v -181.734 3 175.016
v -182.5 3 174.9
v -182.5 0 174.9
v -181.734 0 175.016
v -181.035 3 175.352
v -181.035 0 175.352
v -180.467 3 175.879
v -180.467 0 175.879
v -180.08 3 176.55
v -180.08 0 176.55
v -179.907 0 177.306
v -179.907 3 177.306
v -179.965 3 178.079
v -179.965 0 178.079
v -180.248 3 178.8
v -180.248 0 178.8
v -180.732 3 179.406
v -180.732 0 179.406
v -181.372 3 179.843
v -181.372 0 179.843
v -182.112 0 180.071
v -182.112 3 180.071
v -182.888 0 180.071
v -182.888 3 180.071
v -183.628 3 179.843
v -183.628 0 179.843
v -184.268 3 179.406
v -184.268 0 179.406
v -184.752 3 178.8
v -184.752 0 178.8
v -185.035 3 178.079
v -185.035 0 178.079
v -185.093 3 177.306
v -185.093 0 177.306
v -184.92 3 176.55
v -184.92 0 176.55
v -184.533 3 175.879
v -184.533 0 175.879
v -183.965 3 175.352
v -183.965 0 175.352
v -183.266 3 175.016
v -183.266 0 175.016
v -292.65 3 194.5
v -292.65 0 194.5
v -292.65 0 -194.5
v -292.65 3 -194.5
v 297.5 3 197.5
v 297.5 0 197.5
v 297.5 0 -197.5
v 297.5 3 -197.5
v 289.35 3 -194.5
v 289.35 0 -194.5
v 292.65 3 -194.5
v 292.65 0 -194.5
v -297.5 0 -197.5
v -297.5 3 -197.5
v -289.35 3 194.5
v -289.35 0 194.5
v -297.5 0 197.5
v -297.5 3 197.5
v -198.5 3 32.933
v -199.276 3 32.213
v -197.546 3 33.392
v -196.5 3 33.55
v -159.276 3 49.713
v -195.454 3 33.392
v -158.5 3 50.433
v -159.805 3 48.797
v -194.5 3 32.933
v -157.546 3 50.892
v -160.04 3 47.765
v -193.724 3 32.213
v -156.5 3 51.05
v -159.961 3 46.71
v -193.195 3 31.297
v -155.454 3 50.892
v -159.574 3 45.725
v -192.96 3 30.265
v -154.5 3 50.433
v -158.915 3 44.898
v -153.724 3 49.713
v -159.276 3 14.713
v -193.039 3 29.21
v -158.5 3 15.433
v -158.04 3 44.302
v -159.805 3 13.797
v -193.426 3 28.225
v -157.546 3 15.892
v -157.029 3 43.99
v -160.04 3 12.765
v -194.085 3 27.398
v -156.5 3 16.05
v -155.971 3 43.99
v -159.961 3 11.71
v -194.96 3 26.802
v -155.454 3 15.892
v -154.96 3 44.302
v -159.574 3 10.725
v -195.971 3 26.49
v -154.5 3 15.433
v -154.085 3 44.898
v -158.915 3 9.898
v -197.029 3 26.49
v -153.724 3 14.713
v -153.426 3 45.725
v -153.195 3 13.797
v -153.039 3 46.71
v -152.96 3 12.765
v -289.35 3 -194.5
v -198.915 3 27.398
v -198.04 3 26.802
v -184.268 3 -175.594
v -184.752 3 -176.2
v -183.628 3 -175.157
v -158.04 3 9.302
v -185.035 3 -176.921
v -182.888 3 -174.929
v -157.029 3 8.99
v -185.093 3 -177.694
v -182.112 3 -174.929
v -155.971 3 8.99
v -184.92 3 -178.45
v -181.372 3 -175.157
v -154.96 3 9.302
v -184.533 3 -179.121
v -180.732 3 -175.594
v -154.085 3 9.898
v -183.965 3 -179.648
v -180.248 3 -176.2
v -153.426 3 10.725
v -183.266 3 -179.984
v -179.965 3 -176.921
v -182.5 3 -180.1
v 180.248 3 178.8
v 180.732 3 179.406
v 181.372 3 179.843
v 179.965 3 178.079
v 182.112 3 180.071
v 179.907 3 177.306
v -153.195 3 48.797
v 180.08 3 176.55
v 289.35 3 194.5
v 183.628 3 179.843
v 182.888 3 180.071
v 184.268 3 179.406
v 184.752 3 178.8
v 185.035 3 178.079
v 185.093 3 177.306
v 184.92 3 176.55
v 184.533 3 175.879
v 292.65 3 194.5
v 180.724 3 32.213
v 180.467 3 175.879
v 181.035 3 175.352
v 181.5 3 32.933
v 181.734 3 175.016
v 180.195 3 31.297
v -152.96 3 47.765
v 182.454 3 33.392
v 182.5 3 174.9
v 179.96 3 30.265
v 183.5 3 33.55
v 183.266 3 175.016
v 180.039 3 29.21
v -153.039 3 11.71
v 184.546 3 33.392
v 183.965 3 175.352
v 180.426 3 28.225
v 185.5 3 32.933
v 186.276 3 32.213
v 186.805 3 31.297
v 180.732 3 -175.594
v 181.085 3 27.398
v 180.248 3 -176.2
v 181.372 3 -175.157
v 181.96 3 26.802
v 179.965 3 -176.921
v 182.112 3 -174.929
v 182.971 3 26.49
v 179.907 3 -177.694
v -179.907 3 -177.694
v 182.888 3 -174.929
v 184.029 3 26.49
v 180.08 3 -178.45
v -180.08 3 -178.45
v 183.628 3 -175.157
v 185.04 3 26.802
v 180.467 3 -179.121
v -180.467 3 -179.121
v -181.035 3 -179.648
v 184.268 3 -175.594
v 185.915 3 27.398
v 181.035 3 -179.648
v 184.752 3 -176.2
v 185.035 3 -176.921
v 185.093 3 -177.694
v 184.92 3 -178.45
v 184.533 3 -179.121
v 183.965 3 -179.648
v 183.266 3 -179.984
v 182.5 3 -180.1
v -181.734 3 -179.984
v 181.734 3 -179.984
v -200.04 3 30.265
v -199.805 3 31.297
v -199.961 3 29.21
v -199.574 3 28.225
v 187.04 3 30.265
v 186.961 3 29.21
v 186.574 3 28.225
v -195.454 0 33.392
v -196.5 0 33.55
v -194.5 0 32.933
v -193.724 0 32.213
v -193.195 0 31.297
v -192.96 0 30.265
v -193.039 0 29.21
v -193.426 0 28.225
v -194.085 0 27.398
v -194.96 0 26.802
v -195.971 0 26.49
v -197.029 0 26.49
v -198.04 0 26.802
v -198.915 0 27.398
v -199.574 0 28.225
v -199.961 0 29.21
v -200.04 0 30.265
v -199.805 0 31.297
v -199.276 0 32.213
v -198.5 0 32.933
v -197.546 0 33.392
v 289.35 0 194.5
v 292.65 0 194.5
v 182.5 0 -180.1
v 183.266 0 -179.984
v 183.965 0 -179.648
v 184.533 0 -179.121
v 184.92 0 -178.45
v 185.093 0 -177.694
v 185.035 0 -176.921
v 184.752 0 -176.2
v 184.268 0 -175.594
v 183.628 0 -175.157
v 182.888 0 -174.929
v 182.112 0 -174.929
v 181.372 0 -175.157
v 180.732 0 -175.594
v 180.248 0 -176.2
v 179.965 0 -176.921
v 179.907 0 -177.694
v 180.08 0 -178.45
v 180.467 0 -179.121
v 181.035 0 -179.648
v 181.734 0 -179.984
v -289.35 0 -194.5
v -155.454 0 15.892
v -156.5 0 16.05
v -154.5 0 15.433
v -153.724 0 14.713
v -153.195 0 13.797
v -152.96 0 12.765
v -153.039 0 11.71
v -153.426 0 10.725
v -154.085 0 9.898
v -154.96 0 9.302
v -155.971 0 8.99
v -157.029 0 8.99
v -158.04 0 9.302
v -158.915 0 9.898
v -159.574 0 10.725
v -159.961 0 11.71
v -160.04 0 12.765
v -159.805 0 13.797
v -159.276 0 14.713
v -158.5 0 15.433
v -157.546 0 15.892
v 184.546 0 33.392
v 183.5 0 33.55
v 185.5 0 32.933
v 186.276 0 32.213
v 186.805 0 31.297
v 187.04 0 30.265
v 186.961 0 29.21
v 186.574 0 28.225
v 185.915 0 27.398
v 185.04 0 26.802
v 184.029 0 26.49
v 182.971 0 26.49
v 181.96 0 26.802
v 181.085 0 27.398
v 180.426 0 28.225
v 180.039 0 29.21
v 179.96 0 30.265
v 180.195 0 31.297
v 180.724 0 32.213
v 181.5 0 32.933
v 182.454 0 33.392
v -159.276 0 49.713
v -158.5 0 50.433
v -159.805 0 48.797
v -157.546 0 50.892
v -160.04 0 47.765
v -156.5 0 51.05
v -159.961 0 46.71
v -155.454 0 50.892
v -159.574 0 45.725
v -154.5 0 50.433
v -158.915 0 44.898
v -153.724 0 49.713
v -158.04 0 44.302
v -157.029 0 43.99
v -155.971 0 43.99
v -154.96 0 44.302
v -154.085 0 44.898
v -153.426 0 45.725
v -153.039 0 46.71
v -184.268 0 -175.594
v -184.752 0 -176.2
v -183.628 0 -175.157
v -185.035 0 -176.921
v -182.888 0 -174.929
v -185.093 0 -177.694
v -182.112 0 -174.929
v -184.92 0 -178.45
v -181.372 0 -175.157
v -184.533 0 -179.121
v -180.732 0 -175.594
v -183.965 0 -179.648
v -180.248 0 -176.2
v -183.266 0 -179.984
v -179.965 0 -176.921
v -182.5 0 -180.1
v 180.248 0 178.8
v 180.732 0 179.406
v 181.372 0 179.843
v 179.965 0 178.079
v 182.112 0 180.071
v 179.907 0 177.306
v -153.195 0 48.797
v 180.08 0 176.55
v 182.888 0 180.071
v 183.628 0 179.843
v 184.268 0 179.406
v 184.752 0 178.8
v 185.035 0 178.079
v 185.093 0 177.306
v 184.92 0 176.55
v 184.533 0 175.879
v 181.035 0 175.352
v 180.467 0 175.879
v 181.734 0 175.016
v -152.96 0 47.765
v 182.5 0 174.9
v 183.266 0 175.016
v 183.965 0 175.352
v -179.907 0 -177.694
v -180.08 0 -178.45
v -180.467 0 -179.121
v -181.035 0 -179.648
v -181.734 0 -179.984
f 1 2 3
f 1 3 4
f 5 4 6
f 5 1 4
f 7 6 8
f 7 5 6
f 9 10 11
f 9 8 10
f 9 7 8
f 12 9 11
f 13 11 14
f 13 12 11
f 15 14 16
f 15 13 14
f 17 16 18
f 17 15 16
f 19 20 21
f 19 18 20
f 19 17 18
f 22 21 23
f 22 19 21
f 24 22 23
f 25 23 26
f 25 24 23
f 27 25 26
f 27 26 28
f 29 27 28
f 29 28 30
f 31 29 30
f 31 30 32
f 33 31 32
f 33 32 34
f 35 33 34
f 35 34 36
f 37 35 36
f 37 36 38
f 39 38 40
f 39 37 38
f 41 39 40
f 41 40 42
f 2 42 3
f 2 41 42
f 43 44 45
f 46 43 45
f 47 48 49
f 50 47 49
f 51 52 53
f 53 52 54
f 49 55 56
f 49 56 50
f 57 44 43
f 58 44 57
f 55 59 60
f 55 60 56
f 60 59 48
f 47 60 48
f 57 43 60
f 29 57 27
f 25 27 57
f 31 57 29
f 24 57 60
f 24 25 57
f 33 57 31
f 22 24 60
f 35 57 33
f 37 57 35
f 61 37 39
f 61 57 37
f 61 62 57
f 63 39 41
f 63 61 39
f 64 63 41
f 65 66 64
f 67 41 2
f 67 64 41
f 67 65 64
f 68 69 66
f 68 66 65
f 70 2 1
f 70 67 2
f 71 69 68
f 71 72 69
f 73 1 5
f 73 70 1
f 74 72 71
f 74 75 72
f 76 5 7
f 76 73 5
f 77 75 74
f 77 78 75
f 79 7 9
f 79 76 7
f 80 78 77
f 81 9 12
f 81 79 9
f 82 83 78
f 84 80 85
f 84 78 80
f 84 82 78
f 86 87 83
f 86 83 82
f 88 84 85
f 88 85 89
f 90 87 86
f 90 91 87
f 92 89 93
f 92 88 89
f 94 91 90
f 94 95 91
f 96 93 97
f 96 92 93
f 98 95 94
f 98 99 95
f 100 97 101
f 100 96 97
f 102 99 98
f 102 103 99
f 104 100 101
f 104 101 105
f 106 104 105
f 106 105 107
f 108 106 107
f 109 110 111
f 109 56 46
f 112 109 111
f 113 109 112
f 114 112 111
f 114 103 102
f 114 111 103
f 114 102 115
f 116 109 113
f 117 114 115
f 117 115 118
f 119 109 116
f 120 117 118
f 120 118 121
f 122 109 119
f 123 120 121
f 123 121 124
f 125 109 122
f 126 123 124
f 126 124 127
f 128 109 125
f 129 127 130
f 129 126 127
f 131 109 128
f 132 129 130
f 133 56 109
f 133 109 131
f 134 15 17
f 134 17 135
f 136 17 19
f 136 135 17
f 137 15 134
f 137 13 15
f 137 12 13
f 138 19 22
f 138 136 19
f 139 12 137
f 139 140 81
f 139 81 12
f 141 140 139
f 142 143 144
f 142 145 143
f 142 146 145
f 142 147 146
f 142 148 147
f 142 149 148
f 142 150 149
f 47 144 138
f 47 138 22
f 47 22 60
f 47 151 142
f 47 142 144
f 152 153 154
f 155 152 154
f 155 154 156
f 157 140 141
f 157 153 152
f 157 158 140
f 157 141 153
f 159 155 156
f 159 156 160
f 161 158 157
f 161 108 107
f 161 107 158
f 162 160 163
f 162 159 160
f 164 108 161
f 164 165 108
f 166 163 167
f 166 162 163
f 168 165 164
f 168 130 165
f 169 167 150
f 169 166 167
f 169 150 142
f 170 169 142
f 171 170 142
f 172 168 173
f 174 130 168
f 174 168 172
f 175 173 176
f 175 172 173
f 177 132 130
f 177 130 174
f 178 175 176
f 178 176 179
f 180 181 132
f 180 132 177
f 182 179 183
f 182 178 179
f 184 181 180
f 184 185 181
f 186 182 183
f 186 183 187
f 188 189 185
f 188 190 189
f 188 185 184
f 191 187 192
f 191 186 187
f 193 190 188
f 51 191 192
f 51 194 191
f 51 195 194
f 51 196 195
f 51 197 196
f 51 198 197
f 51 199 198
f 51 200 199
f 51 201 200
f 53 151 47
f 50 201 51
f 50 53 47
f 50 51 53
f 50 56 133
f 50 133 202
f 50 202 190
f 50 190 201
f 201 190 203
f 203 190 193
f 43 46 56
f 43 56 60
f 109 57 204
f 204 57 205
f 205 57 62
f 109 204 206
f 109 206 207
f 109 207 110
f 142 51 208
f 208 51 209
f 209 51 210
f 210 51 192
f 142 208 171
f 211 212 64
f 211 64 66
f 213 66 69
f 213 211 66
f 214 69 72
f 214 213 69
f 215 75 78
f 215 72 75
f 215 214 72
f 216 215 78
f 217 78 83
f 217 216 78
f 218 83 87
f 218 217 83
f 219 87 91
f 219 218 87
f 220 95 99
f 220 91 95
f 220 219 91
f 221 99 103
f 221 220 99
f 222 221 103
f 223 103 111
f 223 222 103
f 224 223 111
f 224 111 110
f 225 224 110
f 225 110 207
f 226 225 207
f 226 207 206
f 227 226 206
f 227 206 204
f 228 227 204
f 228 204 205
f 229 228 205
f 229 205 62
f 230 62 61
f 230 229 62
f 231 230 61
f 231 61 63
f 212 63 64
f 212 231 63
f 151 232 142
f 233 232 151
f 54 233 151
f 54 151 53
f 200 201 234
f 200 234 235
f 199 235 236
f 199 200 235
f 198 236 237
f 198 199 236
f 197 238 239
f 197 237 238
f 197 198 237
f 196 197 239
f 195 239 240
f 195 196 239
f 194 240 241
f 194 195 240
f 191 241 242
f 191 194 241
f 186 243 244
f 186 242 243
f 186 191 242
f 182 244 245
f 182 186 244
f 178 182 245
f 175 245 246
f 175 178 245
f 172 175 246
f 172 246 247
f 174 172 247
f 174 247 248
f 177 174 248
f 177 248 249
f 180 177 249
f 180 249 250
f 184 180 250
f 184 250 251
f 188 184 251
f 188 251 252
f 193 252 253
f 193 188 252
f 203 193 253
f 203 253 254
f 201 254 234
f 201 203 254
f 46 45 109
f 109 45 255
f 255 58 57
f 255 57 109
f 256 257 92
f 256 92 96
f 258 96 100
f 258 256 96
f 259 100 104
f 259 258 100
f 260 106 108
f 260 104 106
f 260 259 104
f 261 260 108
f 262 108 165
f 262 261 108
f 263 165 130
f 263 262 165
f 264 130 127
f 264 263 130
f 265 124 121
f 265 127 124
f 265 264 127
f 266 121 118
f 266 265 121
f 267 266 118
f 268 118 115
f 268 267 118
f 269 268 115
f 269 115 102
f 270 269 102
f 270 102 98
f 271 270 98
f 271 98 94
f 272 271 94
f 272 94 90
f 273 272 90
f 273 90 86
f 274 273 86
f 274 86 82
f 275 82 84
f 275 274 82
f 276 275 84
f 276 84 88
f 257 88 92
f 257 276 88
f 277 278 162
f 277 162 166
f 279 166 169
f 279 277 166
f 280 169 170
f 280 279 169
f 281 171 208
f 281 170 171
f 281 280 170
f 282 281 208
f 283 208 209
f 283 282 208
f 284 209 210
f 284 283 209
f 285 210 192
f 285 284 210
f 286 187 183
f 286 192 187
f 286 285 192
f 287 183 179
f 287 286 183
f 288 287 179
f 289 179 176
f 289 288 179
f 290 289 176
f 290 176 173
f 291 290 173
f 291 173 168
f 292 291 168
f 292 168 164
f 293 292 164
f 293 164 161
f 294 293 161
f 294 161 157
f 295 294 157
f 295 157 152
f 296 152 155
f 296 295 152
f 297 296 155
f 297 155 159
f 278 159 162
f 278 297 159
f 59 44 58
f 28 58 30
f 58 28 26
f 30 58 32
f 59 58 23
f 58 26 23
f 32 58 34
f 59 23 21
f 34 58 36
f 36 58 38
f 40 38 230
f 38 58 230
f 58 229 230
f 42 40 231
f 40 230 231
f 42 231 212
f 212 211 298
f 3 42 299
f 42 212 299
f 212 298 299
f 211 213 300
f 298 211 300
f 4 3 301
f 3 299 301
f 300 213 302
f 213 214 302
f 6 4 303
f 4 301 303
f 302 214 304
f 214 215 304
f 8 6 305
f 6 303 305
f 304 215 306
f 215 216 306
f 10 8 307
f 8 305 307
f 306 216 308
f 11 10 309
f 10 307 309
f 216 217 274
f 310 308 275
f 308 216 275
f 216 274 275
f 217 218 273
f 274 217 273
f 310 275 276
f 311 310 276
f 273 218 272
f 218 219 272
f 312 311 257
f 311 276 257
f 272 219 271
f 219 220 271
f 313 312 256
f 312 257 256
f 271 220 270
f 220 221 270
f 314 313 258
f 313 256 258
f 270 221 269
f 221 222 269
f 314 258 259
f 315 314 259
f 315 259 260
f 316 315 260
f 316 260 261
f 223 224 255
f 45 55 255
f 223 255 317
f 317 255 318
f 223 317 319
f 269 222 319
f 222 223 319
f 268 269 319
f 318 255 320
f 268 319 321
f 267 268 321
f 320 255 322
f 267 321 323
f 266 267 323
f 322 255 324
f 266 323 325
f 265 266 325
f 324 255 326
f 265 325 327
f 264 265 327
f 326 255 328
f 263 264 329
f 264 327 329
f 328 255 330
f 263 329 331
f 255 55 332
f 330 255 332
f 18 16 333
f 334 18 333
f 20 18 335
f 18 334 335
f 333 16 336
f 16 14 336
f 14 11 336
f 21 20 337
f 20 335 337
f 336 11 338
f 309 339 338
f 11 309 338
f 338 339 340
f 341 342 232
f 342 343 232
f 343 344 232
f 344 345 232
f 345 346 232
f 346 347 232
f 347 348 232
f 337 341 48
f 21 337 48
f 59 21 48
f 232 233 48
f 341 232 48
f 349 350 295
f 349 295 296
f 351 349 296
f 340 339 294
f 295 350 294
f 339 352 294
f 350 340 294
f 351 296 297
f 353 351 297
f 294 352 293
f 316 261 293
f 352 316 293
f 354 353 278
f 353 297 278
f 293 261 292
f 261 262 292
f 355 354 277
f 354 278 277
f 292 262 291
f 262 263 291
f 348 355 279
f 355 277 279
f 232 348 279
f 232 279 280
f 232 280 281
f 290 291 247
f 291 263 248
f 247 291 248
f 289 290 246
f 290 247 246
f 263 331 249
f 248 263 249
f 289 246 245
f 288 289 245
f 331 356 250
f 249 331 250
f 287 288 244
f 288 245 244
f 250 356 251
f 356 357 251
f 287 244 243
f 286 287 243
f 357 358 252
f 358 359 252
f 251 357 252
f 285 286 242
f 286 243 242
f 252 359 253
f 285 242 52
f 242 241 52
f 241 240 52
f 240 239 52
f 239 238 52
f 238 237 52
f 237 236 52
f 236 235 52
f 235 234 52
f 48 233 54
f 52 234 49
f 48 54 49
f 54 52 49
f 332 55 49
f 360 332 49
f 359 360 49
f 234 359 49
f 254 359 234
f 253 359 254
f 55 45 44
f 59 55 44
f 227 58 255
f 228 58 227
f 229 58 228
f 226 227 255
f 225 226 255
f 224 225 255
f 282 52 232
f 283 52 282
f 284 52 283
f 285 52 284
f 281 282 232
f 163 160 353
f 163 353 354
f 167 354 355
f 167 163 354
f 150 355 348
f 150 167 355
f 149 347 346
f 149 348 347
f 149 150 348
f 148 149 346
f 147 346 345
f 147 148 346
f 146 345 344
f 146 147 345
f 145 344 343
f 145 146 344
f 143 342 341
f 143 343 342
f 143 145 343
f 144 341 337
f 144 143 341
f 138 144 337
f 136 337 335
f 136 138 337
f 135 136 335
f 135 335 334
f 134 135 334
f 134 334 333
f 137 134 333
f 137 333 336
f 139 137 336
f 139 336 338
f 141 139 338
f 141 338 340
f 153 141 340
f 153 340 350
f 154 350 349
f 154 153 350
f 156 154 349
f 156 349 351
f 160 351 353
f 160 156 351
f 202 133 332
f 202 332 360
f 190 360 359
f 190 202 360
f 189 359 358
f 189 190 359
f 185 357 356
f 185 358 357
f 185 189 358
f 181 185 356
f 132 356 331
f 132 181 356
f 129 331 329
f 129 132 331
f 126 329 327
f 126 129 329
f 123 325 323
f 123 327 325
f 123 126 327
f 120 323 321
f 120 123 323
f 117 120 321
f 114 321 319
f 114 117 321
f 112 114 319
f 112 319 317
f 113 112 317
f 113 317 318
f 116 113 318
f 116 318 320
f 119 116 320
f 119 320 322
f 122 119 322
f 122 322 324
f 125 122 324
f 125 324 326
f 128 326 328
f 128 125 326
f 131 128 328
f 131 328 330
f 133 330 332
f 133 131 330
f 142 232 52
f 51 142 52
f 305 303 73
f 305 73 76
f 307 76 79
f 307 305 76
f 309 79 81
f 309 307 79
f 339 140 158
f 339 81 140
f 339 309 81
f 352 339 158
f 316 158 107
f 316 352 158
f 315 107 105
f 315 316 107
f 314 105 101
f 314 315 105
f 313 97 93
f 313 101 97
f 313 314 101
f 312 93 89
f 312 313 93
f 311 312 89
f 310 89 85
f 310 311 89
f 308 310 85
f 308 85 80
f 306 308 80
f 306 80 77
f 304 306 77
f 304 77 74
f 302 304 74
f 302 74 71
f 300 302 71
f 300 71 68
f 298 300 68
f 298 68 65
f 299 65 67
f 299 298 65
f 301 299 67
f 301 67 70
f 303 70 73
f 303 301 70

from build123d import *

# Parameters (mm, degrees)
SKETCH1_W               = 595
SKETCH1_H               = 395
BOSS_EXTRUDE1_DEPTH     = 3
CUT_EXTRUDE1_DEPTH      = 358.10152618
CUT_EXTRUDE1_DEPTH_BACK = 358.10152618
SKETCH2_R               = 3.55
CUT_EXTRUDE2_DEPTH      = 358.10152618
CUT_EXTRUDE2_DEPTH_BACK = 358.10152618
SKETCH3_W               = 3.3
SKETCH3_H               = 389
CUT_EXTRUDE3_DEPTH      = 358.10152618
CUT_EXTRUDE3_DEPTH_BACK = 358.10152618
SKETCH4_R               = 2.6


with BuildPart() as part:
    # Sketch1 → Boss-Extrude1 (new body)
    with BuildSketch(Plane(origin=(0, 0, 0), x_dir=(1, 0, 0), z_dir=(0, 1, 0))):
        Rectangle(SKETCH1_W, SKETCH1_H)
    extrude(amount=BOSS_EXTRUDE1_DEPTH)

    # Sketch2 → Cut-Extrude1 (cut, two sides: drawn at the far end of the back side and taken through both)
    with BuildSketch(Plane(origin=(0, 3, 0), x_dir=(1, 0, 0), z_dir=(0, 1, 0)).offset(-CUT_EXTRUDE1_DEPTH_BACK)):
        with Locations(Location((-196.5, -30, 0), (0, 0, 270))):
            Circle(SKETCH2_R)
        with Locations(Location((-156.5, -47.5, 0), (0, 0, 270))):
            Circle(SKETCH2_R)
        with Locations(Location((-156.5, -12.5, 0), (0, 0, 270))):
            Circle(SKETCH2_R)
        with Locations(Location((183.5, -30, 0), (0, 0, 270))):
            Circle(SKETCH2_R)
    extrude(amount=CUT_EXTRUDE1_DEPTH + CUT_EXTRUDE1_DEPTH_BACK, mode=Mode.SUBTRACT)

    # Sketch3 → Cut-Extrude2 (cut, two sides: drawn at the far end of the back side and taken through both)
    with BuildSketch(Plane(origin=(0, 3, 0), x_dir=(1, 0, 0), z_dir=(0, 1, 0)).offset(-CUT_EXTRUDE2_DEPTH_BACK)):
        with Locations((291, 0)):
            Rectangle(SKETCH3_W, SKETCH3_H)
        with Locations((-291, 0)):
            Rectangle(SKETCH3_W, SKETCH3_H)
    extrude(amount=CUT_EXTRUDE2_DEPTH + CUT_EXTRUDE2_DEPTH_BACK, mode=Mode.SUBTRACT)

    # Sketch4 → Cut-Extrude3 (cut, two sides: drawn at the far end of the back side and taken through both)
    with BuildSketch(Plane(origin=(0, 0, 0), x_dir=(-1, 0, 0), z_dir=(0, -1, 0)).offset(-CUT_EXTRUDE3_DEPTH_BACK)):
        with Locations(Location((-182.5, -177.5, 0), (0, 0, 90))):
            Circle(SKETCH4_R)
        with Locations(Location((182.5, -177.5, 0), (0, 0, 90))):
            Circle(SKETCH4_R)
        with Locations(Location((182.5, 177.5, 0), (0, 0, 90))):
            Circle(SKETCH4_R)
        with Locations(Location((-182.5, 177.5, 0), (0, 0, 90))):
            Circle(SKETCH4_R)
    extrude(amount=CUT_EXTRUDE3_DEPTH + CUT_EXTRUDE3_DEPTH_BACK, mode=Mode.SUBTRACT)


solid = part.part
